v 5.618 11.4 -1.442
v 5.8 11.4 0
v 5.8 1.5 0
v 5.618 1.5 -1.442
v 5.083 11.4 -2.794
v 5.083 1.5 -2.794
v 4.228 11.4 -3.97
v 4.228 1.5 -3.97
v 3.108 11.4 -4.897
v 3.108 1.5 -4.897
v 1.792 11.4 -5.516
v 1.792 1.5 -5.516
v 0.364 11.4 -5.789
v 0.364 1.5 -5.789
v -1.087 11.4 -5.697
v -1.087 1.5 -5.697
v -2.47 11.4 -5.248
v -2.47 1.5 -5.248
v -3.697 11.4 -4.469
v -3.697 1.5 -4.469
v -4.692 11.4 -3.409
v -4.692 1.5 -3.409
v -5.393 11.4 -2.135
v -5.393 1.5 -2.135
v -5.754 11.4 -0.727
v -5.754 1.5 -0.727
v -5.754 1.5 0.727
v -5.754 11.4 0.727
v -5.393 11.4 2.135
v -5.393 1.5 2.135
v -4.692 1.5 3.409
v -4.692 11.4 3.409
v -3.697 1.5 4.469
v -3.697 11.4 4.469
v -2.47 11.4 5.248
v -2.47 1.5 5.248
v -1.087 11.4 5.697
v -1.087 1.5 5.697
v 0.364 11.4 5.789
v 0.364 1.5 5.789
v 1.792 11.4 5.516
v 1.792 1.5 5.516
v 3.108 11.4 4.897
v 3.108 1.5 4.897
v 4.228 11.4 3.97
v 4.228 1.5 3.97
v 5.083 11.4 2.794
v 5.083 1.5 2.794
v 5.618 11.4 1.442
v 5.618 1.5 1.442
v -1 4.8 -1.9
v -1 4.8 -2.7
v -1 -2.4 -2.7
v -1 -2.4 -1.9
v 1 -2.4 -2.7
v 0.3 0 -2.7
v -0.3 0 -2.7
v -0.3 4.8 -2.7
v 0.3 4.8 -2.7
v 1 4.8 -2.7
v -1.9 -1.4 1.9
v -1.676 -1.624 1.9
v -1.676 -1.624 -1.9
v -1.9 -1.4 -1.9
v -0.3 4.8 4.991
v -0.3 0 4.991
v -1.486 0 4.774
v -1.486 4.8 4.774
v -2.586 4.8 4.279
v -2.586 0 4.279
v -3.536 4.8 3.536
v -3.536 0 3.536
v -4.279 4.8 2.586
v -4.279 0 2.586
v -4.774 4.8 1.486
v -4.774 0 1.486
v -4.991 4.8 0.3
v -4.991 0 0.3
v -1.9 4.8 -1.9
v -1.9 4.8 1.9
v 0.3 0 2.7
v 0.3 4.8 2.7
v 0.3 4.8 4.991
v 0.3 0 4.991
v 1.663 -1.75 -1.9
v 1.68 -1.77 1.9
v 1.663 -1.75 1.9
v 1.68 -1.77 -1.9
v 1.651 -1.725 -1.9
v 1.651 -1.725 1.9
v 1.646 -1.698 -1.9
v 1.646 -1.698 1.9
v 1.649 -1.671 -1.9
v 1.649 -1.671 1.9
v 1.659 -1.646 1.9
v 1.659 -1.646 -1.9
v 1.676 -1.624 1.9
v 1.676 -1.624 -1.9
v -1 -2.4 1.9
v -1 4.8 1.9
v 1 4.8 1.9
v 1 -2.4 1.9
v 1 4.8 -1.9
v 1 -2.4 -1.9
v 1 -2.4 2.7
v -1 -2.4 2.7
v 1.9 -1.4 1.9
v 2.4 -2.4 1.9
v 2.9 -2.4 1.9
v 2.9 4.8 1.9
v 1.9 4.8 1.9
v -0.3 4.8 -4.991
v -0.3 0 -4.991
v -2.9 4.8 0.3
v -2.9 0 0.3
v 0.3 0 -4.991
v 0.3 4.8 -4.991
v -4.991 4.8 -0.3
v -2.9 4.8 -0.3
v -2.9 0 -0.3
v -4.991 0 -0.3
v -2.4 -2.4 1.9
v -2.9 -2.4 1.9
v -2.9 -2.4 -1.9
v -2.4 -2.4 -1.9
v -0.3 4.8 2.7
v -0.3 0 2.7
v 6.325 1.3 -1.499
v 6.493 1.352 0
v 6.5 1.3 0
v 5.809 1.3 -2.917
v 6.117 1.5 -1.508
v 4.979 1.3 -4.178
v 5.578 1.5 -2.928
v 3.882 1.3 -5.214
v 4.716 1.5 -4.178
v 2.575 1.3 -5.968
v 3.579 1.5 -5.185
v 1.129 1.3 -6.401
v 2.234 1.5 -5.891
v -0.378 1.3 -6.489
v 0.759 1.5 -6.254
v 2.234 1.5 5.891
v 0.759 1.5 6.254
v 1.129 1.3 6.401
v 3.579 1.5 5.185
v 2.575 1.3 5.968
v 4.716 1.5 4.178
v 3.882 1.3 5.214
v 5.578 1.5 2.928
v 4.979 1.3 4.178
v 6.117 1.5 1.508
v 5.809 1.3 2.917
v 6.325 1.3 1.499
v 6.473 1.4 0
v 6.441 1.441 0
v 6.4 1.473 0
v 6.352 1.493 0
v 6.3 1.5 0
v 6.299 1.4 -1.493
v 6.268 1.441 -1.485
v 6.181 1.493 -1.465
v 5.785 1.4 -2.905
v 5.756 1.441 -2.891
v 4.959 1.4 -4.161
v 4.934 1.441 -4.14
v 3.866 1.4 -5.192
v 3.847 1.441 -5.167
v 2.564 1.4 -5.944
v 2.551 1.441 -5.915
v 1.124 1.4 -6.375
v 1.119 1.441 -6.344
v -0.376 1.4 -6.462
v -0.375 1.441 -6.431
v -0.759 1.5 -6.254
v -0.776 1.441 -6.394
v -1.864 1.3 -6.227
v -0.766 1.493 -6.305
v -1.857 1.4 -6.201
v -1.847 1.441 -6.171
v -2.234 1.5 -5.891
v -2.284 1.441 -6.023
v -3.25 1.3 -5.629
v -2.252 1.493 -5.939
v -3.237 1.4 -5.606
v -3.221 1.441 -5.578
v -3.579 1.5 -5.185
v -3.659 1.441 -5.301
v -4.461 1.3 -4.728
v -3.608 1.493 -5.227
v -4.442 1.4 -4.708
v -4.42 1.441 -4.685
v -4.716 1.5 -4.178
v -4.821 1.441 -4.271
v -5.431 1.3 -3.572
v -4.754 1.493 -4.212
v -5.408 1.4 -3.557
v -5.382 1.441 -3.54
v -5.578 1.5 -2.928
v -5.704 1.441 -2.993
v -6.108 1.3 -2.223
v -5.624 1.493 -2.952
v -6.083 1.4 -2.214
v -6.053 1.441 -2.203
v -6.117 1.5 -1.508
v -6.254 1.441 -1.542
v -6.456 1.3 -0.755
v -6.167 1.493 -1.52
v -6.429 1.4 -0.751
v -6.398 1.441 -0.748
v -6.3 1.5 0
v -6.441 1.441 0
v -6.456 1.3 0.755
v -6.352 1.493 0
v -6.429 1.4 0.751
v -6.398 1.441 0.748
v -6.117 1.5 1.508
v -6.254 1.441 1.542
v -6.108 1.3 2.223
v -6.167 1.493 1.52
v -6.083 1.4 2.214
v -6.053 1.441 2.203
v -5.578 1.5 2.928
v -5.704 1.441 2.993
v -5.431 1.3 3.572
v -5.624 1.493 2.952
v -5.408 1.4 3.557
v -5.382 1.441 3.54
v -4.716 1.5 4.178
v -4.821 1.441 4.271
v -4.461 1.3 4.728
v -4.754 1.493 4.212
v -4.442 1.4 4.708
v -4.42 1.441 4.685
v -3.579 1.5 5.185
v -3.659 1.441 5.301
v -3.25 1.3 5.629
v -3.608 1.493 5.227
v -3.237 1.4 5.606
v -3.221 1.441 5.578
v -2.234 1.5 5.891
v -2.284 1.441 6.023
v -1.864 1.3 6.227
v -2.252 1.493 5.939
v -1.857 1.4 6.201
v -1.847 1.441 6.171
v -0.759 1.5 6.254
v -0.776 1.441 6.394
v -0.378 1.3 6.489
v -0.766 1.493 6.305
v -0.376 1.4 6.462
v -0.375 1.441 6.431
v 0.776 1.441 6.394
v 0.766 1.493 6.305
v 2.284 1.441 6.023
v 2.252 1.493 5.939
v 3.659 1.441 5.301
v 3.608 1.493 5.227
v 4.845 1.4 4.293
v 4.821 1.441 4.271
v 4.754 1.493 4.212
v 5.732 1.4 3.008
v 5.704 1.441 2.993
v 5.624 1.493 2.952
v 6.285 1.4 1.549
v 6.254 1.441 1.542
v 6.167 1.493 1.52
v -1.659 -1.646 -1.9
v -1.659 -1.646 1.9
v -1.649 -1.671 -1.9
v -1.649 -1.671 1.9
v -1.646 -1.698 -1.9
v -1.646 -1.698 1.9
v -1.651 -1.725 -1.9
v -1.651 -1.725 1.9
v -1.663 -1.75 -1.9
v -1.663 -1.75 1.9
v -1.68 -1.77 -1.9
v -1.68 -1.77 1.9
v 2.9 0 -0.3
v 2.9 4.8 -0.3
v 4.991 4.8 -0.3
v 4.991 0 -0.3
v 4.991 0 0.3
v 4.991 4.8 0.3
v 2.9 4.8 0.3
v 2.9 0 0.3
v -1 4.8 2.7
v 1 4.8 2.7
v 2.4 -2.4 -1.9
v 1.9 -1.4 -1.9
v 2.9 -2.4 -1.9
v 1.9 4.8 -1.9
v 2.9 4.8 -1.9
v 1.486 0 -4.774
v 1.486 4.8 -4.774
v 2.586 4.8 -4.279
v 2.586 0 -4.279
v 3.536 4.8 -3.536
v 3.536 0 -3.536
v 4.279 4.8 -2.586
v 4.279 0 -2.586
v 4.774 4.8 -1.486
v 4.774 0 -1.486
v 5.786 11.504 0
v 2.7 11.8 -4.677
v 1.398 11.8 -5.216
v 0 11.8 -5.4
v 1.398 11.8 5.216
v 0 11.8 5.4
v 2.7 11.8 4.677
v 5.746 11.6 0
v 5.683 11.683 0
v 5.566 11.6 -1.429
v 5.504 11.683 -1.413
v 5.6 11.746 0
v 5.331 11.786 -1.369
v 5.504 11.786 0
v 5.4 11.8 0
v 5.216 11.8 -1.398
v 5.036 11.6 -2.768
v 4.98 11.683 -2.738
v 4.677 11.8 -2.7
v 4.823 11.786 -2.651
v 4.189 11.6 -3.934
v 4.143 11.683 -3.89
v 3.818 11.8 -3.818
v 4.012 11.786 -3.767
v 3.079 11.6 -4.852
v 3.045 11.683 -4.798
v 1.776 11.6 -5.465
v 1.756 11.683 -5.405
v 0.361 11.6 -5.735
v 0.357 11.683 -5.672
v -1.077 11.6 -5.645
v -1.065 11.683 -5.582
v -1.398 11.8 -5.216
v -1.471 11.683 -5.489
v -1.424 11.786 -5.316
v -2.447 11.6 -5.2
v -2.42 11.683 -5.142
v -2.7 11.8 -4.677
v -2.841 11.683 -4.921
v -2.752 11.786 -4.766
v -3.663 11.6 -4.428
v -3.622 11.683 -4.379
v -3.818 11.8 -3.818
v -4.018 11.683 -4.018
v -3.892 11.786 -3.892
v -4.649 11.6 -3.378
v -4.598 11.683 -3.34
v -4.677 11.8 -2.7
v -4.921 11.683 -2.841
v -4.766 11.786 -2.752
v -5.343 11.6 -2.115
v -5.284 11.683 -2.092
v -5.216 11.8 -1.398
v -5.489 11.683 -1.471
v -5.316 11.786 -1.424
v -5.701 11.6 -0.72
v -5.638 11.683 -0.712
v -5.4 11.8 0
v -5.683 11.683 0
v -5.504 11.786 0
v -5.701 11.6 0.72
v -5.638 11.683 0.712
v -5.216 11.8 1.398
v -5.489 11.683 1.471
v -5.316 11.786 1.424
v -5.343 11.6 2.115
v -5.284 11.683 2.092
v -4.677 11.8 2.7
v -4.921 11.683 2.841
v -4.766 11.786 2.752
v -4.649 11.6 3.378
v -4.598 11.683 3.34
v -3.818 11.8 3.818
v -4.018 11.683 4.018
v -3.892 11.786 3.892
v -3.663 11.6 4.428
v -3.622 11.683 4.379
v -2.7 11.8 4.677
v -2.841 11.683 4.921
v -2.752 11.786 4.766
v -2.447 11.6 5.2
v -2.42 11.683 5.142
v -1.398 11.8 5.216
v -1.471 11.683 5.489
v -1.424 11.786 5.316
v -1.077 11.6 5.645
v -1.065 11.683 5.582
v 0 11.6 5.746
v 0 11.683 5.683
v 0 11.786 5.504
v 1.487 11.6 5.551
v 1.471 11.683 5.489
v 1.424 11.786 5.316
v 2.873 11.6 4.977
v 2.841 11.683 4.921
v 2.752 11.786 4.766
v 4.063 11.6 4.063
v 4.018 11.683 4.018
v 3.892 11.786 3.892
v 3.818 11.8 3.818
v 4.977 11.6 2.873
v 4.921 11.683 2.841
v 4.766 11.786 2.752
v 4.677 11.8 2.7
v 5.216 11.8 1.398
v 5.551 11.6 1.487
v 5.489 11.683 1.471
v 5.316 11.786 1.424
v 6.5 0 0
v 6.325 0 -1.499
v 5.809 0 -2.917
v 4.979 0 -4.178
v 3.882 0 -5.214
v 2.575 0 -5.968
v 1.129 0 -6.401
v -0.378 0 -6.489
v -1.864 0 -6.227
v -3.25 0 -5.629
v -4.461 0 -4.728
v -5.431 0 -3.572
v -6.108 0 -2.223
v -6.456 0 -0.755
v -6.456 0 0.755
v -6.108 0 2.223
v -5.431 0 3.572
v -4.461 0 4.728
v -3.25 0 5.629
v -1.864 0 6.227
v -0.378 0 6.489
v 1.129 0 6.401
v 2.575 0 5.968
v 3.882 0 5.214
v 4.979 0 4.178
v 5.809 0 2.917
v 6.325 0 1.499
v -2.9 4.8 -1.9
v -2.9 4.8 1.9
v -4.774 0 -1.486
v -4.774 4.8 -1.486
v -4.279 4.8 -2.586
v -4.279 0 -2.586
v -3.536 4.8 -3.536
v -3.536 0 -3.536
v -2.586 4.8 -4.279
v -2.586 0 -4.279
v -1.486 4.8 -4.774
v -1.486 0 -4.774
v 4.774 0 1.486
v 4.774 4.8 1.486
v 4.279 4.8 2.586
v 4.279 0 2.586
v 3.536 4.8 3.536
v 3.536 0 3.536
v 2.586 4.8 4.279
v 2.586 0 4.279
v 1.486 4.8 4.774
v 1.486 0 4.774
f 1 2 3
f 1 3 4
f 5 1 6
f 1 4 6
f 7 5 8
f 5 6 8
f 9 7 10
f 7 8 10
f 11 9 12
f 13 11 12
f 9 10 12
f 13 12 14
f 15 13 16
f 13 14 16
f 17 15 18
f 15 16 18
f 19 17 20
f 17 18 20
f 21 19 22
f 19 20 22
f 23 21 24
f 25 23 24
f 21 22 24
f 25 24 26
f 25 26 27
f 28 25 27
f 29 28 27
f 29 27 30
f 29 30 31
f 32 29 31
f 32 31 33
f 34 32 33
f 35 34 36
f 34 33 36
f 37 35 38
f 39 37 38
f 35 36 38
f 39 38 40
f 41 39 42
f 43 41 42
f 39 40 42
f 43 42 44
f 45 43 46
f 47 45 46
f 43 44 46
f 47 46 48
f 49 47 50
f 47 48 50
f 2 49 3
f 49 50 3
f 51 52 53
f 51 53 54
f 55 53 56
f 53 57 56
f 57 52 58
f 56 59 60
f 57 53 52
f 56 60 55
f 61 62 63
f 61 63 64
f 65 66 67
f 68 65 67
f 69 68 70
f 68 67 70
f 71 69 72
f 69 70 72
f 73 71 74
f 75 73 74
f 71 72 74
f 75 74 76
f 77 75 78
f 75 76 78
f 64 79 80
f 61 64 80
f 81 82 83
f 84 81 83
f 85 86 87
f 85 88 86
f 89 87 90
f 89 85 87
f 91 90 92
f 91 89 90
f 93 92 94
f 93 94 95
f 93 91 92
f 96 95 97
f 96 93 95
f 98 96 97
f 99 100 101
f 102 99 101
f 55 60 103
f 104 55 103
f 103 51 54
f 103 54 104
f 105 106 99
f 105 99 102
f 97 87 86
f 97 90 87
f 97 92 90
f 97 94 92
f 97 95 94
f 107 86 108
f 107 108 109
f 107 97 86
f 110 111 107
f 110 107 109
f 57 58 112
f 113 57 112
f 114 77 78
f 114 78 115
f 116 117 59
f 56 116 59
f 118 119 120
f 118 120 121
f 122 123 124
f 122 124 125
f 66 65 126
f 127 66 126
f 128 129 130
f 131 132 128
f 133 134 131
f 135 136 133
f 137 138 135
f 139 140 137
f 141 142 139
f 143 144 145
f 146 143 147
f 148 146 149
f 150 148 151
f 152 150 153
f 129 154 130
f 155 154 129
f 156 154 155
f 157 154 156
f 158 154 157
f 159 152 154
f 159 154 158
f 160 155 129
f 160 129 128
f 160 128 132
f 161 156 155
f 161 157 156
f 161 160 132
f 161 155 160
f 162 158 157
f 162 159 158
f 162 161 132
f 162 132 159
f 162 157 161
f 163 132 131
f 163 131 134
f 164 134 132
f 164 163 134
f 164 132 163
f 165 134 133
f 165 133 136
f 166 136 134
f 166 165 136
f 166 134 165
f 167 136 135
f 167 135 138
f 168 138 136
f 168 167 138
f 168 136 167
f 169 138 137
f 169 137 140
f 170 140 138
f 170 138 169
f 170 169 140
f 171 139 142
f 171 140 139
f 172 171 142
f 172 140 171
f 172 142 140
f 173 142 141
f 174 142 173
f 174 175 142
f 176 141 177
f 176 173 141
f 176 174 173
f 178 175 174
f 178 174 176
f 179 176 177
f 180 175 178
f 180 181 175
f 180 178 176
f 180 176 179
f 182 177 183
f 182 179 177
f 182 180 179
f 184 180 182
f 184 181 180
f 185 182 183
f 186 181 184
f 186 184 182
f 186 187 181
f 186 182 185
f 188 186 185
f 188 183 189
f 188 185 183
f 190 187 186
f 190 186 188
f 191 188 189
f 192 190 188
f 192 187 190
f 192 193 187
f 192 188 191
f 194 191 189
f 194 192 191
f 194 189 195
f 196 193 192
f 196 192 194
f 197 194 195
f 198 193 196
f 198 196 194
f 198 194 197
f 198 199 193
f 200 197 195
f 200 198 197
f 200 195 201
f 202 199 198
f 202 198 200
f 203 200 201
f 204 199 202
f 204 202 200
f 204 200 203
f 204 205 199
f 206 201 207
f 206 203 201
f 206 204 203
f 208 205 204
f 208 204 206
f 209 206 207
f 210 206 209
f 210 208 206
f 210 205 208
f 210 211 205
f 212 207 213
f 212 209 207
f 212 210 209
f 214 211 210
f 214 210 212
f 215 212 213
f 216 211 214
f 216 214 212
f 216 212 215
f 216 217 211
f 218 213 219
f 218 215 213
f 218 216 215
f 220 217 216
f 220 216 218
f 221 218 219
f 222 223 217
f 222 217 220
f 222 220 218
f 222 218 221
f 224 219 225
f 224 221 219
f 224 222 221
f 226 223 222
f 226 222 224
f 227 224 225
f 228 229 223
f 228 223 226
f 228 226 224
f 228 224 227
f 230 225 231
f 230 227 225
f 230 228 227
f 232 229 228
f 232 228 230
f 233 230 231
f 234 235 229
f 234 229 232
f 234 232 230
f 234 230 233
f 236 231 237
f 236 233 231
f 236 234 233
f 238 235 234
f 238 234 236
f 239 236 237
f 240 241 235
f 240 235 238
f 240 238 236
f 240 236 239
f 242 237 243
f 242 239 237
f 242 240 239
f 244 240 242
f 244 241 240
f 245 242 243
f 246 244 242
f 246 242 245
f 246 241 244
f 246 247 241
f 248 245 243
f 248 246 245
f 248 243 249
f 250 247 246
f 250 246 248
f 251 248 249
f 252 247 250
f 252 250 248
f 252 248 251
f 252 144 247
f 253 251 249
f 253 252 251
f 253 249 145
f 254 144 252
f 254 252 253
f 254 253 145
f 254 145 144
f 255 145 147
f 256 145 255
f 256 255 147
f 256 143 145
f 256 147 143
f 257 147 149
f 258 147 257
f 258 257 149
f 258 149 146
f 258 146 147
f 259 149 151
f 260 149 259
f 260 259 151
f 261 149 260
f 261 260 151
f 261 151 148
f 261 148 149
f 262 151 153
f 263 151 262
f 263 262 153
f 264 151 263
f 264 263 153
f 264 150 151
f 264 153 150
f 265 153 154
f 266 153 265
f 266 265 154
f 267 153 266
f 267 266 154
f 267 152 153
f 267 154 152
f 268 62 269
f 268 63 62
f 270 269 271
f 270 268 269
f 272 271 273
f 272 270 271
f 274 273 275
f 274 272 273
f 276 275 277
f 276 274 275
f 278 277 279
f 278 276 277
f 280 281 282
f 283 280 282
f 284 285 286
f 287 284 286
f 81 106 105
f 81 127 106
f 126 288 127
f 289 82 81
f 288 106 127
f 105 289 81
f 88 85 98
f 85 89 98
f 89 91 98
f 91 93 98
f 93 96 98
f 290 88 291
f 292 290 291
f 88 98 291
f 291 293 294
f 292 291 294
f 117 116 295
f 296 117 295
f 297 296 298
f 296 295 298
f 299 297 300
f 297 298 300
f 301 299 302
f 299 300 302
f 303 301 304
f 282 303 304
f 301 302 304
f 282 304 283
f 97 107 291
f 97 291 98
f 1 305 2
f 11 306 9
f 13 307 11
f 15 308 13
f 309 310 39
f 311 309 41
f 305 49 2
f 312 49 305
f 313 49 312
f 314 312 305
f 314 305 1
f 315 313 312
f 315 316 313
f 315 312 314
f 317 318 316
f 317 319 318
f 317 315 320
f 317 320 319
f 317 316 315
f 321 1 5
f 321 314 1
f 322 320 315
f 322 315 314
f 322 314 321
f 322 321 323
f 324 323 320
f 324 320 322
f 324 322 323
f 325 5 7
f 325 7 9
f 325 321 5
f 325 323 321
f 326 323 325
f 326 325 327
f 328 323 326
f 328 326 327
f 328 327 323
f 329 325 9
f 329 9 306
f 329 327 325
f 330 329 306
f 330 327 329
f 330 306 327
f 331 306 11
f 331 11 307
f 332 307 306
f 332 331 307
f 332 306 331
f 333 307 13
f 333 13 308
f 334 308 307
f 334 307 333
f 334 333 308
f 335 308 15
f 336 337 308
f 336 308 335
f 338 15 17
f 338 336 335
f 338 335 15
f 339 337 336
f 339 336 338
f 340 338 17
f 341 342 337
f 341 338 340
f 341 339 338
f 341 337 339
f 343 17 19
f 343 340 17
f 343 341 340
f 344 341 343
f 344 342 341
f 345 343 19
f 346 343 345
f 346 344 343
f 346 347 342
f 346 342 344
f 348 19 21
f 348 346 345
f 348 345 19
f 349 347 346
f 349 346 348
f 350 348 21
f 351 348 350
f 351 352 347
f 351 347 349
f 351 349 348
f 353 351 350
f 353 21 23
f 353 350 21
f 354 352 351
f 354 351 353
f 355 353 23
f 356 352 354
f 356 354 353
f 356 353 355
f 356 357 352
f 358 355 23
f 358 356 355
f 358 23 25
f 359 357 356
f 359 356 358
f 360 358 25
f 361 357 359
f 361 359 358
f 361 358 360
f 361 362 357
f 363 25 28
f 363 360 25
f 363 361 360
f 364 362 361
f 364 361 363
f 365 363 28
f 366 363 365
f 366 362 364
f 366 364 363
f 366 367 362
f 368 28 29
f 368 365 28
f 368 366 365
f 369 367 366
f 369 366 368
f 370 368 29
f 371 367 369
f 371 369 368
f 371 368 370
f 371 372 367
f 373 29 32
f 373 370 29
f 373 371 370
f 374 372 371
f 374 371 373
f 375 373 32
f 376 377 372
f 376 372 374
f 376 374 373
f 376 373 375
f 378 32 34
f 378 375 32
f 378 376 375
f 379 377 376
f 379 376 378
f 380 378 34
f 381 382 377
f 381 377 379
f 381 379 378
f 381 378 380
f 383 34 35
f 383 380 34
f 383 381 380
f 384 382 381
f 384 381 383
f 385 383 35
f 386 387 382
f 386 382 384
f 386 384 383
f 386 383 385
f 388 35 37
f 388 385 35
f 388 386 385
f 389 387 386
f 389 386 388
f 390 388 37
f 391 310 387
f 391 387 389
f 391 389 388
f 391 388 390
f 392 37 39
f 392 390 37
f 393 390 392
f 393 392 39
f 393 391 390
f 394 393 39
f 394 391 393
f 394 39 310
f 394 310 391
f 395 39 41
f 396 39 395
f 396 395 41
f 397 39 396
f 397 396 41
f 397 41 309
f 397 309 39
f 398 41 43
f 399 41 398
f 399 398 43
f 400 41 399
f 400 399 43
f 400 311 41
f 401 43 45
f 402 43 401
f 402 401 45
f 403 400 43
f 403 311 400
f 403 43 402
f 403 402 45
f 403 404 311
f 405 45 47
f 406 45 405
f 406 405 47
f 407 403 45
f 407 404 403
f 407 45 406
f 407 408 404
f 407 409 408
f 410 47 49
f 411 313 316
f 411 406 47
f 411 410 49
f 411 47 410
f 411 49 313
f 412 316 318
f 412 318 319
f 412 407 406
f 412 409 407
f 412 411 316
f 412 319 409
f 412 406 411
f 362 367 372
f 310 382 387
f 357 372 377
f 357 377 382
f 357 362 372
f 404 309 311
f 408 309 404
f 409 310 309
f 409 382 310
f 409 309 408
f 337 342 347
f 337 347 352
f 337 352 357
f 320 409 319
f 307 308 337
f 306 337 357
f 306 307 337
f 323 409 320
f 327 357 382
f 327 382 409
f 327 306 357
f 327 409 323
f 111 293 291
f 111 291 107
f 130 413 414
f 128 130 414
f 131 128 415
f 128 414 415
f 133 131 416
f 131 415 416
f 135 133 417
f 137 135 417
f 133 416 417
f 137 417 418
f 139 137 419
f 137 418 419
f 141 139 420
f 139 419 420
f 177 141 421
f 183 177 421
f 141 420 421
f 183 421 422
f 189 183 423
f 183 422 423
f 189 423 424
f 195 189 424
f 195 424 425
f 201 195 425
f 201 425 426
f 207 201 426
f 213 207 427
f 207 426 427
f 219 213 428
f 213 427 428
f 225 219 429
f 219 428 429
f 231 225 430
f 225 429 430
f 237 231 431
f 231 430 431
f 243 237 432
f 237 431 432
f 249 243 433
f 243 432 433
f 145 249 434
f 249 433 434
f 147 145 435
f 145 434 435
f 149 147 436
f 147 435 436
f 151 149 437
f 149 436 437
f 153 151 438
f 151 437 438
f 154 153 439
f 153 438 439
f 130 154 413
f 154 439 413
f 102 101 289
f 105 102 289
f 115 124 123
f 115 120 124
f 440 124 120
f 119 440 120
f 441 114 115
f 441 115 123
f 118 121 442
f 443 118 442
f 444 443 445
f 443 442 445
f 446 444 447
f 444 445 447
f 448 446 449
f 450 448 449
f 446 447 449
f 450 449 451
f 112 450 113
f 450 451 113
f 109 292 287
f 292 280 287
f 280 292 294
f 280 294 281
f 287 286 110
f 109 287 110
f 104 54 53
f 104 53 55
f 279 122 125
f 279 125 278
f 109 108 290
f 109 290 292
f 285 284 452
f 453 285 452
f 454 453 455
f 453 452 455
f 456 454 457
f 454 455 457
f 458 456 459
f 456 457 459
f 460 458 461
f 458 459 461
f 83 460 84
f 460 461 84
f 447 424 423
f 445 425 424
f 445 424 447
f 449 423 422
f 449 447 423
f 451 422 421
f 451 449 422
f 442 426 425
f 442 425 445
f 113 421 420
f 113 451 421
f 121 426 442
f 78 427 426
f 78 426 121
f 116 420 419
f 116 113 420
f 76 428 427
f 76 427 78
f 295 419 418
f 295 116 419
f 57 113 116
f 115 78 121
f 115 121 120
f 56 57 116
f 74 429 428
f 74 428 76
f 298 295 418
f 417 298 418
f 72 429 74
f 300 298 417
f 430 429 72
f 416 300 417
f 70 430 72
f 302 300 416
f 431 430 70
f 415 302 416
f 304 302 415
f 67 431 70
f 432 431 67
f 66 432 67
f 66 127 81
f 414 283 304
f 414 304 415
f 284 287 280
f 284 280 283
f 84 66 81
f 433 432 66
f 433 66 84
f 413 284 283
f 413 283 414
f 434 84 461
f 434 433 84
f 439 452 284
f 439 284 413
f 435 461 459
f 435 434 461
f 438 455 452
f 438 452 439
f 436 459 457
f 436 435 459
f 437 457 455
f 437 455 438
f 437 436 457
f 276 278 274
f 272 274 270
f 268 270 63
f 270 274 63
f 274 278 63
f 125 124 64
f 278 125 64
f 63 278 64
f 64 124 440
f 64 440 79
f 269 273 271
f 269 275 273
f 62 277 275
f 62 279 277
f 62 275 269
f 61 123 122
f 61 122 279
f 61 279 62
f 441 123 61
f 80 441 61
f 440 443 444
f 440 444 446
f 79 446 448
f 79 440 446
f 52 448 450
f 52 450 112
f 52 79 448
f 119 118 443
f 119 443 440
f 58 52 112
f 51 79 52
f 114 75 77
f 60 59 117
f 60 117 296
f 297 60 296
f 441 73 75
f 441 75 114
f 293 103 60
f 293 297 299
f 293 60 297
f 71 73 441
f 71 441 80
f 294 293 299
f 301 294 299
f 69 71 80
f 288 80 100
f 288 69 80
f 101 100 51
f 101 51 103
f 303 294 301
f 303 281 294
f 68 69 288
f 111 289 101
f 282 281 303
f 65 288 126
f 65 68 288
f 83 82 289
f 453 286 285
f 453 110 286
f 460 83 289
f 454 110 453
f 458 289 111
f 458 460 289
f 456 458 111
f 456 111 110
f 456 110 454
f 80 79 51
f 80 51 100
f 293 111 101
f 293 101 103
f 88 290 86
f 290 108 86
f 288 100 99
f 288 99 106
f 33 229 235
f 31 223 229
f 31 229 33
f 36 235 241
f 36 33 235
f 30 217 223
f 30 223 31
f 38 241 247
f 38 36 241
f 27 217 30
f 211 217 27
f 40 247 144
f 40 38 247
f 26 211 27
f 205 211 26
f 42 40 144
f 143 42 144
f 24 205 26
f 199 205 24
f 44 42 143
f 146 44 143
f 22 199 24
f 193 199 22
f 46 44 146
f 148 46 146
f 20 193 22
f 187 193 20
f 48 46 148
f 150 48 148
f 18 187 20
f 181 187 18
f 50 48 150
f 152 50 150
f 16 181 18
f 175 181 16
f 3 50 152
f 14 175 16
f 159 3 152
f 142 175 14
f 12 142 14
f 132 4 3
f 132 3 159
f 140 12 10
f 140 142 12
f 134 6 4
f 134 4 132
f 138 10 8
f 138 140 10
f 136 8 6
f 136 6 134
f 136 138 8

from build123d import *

# Parameters (mm, degrees)
SKETCH1_R           = 6.5
BOSS_EXTRUDE1_DEPTH = 1.5
SKETCH2_R           = 5.8
BOSS_EXTRUDE2_DEPTH = 10.3
FILLET1_R           = 0.4
SKETCH3_R           = 5
CUT_EXTRUDE1_DEPTH  = 4.8
BOSS_EXTRUDE3_DEPTH = 4.8
SKETCH5_W           = 2
SKETCH5_H           = 0.8
SKETCH5_W_2         = 1
SKETCH5_H_2         = 3.8
BOSS_EXTRUDE4_DEPTH = 7.2
CUT_EXTRUDE2_REACH  = 10.4
BOSS_EXTRUDE5_DEPTH = 3.8
FILLET2_R           = 0.1
FILLET3_R           = 0.2


with BuildPart() as part:
    # Sketch1 → Boss-Extrude1 (new body)
    with BuildSketch(Plane(origin=(0, 0, 0), x_dir=(1, 0, 0), z_dir=(0, 1, 0))):
        Circle(SKETCH1_R)
    extrude(amount=BOSS_EXTRUDE1_DEPTH)

    # Sketch2 → Boss-Extrude2 (add)
    with BuildSketch(Plane(origin=(0, 1.5, 0), x_dir=(1, 0, 0), z_dir=(0, 1, 0))):
        Circle(SKETCH2_R)
    extrude(amount=BOSS_EXTRUDE2_DEPTH)

    # Fillet1
    fillet1_edges = [part.edges().sort_by_distance(p)[0] for p in [
        (-5.8, 11.8, 0),
    ]]
    fillet(fillet1_edges, radius=FILLET1_R)

    # Sketch3 → Cut-Extrude1 (cut)
    with BuildSketch(Plane.XZ):
        Circle(SKETCH3_R)
    extrude(amount=-CUT_EXTRUDE1_DEPTH, mode=Mode.SUBTRACT)

    # Sketch4 → Boss-Extrude3 (add)
    with BuildSketch(Plane.XZ.offset(-4.8)):
        with BuildLine():
            Line((-4.990991885, 0.3), (-2.9, 0.3))
            Line((-2.9, 0.3), (-2.9, -0.3))
            Line((-2.9, -0.3), (-4.990991885, -0.3))
            ThreePointArc((-4.990991885, -0.3), (-5, 0), (-4.990991885, 0.3))
        make_face()
        with BuildLine():
            Line((2.9, 0.3), (2.9, -0.3))
            Line((2.9, -0.3), (4.990991885, -0.3))
            ThreePointArc((4.990991885, -0.3), (5, 0), (4.990991885, 0.3))
            Line((4.990991885, 0.3), (2.9, 0.3))
        make_face()
        with BuildLine():
            Line((-0.3, 4.990991885), (-0.3, 2.7))
            Line((-0.3, 2.7), (0.3, 2.7))
            Line((0.3, 2.7), (0.3, 4.990991885))
            ThreePointArc((0.3, 4.990991885), (0, 5), (-0.3, 4.990991885))
        make_face()
        with BuildLine():
            Line((0.3, -2.7), (-0.3, -2.7))
            Line((-0.3, -2.7), (-0.3, -4.990991885))
            ThreePointArc((-0.3, -4.990991885), (0, -5), (0.3, -4.990991885))
            Line((0.3, -4.990991885), (0.3, -2.7))
        make_face()
    extrude(amount=BOSS_EXTRUDE3_DEPTH)

    # Sketch5 → Boss-Extrude4 (add)
    with BuildSketch(Plane.XZ.offset(-4.8)):
        with Locations((0, 2.3)):
            Rectangle(SKETCH5_W, SKETCH5_H)
        with Locations((-2.4, 0)):
            Rectangle(SKETCH5_W_2, SKETCH5_H_2)
        with Locations((2.4, 0)):
            Rectangle(SKETCH5_W_2, SKETCH5_H_2)
        with Locations((0, -2.3)):
            Rectangle(SKETCH5_W, SKETCH5_H)
    extrude(amount=BOSS_EXTRUDE4_DEPTH)

    # Sketch6 → Cut-Extrude2 (cut, up to next)
    with BuildSketch(Plane.XY.offset(1.9), mode=Mode.PRIVATE) as cut_extrude2_sk1:
        Polygon((-1.9, -2.4), (-1.9, -1.9625), (-2.4, -2.4), align=None)
    cut_extrude2_tool1 = extrude(cut_extrude2_sk1.sketch, amount=-CUT_EXTRUDE2_REACH, mode=Mode.PRIVATE) & part.part
    add(cut_extrude2_tool1.solids().sort_by_distance((-2.066667, -2.254167, 1.9))[0], mode=Mode.SUBTRACT)
    # Sketch6 → Cut-Extrude2 (cut, up to next)
    with BuildSketch(Plane.XY.offset(1.9), mode=Mode.PRIVATE) as cut_extrude2_sk2:
        Polygon((1.9, -1.9625), (1.9, -2.4), (2.4, -2.4), align=None)
    cut_extrude2_tool2 = extrude(cut_extrude2_sk2.sketch, amount=-CUT_EXTRUDE2_REACH, mode=Mode.PRIVATE) & part.part
    add(cut_extrude2_tool2.solids().sort_by_distance((2.066667, -2.254167, 1.9))[0], mode=Mode.SUBTRACT)

    # Sketch6<3> → Boss-Extrude5 (add)
    with BuildSketch(Plane.XY.offset(1.9)):
        Polygon((-1.6, -1.7), (-1.9, -1.4), (-1.9, -1.9625), align=None)
        Polygon((1.6, -1.7), (1.9, -1.9625), (1.9, -1.4), align=None)
    extrude(amount=-BOSS_EXTRUDE5_DEPTH)

    # Fillet2
    fillet2_edges = [part.edges().sort_by_distance(p)[0] for p in [
        (-1.6, -1.7, 0),
        (1.6, -1.7, 0),
    ]]
    fillet(fillet2_edges, radius=FILLET2_R)

    # Fillet3
    fillet3_edges = [part.edges().sort_by_distance(p)[0] for p in [
        (-6.5, 1.5, 0),
    ]]
    fillet(fillet3_edges, radius=FILLET3_R)


solid = part.part
